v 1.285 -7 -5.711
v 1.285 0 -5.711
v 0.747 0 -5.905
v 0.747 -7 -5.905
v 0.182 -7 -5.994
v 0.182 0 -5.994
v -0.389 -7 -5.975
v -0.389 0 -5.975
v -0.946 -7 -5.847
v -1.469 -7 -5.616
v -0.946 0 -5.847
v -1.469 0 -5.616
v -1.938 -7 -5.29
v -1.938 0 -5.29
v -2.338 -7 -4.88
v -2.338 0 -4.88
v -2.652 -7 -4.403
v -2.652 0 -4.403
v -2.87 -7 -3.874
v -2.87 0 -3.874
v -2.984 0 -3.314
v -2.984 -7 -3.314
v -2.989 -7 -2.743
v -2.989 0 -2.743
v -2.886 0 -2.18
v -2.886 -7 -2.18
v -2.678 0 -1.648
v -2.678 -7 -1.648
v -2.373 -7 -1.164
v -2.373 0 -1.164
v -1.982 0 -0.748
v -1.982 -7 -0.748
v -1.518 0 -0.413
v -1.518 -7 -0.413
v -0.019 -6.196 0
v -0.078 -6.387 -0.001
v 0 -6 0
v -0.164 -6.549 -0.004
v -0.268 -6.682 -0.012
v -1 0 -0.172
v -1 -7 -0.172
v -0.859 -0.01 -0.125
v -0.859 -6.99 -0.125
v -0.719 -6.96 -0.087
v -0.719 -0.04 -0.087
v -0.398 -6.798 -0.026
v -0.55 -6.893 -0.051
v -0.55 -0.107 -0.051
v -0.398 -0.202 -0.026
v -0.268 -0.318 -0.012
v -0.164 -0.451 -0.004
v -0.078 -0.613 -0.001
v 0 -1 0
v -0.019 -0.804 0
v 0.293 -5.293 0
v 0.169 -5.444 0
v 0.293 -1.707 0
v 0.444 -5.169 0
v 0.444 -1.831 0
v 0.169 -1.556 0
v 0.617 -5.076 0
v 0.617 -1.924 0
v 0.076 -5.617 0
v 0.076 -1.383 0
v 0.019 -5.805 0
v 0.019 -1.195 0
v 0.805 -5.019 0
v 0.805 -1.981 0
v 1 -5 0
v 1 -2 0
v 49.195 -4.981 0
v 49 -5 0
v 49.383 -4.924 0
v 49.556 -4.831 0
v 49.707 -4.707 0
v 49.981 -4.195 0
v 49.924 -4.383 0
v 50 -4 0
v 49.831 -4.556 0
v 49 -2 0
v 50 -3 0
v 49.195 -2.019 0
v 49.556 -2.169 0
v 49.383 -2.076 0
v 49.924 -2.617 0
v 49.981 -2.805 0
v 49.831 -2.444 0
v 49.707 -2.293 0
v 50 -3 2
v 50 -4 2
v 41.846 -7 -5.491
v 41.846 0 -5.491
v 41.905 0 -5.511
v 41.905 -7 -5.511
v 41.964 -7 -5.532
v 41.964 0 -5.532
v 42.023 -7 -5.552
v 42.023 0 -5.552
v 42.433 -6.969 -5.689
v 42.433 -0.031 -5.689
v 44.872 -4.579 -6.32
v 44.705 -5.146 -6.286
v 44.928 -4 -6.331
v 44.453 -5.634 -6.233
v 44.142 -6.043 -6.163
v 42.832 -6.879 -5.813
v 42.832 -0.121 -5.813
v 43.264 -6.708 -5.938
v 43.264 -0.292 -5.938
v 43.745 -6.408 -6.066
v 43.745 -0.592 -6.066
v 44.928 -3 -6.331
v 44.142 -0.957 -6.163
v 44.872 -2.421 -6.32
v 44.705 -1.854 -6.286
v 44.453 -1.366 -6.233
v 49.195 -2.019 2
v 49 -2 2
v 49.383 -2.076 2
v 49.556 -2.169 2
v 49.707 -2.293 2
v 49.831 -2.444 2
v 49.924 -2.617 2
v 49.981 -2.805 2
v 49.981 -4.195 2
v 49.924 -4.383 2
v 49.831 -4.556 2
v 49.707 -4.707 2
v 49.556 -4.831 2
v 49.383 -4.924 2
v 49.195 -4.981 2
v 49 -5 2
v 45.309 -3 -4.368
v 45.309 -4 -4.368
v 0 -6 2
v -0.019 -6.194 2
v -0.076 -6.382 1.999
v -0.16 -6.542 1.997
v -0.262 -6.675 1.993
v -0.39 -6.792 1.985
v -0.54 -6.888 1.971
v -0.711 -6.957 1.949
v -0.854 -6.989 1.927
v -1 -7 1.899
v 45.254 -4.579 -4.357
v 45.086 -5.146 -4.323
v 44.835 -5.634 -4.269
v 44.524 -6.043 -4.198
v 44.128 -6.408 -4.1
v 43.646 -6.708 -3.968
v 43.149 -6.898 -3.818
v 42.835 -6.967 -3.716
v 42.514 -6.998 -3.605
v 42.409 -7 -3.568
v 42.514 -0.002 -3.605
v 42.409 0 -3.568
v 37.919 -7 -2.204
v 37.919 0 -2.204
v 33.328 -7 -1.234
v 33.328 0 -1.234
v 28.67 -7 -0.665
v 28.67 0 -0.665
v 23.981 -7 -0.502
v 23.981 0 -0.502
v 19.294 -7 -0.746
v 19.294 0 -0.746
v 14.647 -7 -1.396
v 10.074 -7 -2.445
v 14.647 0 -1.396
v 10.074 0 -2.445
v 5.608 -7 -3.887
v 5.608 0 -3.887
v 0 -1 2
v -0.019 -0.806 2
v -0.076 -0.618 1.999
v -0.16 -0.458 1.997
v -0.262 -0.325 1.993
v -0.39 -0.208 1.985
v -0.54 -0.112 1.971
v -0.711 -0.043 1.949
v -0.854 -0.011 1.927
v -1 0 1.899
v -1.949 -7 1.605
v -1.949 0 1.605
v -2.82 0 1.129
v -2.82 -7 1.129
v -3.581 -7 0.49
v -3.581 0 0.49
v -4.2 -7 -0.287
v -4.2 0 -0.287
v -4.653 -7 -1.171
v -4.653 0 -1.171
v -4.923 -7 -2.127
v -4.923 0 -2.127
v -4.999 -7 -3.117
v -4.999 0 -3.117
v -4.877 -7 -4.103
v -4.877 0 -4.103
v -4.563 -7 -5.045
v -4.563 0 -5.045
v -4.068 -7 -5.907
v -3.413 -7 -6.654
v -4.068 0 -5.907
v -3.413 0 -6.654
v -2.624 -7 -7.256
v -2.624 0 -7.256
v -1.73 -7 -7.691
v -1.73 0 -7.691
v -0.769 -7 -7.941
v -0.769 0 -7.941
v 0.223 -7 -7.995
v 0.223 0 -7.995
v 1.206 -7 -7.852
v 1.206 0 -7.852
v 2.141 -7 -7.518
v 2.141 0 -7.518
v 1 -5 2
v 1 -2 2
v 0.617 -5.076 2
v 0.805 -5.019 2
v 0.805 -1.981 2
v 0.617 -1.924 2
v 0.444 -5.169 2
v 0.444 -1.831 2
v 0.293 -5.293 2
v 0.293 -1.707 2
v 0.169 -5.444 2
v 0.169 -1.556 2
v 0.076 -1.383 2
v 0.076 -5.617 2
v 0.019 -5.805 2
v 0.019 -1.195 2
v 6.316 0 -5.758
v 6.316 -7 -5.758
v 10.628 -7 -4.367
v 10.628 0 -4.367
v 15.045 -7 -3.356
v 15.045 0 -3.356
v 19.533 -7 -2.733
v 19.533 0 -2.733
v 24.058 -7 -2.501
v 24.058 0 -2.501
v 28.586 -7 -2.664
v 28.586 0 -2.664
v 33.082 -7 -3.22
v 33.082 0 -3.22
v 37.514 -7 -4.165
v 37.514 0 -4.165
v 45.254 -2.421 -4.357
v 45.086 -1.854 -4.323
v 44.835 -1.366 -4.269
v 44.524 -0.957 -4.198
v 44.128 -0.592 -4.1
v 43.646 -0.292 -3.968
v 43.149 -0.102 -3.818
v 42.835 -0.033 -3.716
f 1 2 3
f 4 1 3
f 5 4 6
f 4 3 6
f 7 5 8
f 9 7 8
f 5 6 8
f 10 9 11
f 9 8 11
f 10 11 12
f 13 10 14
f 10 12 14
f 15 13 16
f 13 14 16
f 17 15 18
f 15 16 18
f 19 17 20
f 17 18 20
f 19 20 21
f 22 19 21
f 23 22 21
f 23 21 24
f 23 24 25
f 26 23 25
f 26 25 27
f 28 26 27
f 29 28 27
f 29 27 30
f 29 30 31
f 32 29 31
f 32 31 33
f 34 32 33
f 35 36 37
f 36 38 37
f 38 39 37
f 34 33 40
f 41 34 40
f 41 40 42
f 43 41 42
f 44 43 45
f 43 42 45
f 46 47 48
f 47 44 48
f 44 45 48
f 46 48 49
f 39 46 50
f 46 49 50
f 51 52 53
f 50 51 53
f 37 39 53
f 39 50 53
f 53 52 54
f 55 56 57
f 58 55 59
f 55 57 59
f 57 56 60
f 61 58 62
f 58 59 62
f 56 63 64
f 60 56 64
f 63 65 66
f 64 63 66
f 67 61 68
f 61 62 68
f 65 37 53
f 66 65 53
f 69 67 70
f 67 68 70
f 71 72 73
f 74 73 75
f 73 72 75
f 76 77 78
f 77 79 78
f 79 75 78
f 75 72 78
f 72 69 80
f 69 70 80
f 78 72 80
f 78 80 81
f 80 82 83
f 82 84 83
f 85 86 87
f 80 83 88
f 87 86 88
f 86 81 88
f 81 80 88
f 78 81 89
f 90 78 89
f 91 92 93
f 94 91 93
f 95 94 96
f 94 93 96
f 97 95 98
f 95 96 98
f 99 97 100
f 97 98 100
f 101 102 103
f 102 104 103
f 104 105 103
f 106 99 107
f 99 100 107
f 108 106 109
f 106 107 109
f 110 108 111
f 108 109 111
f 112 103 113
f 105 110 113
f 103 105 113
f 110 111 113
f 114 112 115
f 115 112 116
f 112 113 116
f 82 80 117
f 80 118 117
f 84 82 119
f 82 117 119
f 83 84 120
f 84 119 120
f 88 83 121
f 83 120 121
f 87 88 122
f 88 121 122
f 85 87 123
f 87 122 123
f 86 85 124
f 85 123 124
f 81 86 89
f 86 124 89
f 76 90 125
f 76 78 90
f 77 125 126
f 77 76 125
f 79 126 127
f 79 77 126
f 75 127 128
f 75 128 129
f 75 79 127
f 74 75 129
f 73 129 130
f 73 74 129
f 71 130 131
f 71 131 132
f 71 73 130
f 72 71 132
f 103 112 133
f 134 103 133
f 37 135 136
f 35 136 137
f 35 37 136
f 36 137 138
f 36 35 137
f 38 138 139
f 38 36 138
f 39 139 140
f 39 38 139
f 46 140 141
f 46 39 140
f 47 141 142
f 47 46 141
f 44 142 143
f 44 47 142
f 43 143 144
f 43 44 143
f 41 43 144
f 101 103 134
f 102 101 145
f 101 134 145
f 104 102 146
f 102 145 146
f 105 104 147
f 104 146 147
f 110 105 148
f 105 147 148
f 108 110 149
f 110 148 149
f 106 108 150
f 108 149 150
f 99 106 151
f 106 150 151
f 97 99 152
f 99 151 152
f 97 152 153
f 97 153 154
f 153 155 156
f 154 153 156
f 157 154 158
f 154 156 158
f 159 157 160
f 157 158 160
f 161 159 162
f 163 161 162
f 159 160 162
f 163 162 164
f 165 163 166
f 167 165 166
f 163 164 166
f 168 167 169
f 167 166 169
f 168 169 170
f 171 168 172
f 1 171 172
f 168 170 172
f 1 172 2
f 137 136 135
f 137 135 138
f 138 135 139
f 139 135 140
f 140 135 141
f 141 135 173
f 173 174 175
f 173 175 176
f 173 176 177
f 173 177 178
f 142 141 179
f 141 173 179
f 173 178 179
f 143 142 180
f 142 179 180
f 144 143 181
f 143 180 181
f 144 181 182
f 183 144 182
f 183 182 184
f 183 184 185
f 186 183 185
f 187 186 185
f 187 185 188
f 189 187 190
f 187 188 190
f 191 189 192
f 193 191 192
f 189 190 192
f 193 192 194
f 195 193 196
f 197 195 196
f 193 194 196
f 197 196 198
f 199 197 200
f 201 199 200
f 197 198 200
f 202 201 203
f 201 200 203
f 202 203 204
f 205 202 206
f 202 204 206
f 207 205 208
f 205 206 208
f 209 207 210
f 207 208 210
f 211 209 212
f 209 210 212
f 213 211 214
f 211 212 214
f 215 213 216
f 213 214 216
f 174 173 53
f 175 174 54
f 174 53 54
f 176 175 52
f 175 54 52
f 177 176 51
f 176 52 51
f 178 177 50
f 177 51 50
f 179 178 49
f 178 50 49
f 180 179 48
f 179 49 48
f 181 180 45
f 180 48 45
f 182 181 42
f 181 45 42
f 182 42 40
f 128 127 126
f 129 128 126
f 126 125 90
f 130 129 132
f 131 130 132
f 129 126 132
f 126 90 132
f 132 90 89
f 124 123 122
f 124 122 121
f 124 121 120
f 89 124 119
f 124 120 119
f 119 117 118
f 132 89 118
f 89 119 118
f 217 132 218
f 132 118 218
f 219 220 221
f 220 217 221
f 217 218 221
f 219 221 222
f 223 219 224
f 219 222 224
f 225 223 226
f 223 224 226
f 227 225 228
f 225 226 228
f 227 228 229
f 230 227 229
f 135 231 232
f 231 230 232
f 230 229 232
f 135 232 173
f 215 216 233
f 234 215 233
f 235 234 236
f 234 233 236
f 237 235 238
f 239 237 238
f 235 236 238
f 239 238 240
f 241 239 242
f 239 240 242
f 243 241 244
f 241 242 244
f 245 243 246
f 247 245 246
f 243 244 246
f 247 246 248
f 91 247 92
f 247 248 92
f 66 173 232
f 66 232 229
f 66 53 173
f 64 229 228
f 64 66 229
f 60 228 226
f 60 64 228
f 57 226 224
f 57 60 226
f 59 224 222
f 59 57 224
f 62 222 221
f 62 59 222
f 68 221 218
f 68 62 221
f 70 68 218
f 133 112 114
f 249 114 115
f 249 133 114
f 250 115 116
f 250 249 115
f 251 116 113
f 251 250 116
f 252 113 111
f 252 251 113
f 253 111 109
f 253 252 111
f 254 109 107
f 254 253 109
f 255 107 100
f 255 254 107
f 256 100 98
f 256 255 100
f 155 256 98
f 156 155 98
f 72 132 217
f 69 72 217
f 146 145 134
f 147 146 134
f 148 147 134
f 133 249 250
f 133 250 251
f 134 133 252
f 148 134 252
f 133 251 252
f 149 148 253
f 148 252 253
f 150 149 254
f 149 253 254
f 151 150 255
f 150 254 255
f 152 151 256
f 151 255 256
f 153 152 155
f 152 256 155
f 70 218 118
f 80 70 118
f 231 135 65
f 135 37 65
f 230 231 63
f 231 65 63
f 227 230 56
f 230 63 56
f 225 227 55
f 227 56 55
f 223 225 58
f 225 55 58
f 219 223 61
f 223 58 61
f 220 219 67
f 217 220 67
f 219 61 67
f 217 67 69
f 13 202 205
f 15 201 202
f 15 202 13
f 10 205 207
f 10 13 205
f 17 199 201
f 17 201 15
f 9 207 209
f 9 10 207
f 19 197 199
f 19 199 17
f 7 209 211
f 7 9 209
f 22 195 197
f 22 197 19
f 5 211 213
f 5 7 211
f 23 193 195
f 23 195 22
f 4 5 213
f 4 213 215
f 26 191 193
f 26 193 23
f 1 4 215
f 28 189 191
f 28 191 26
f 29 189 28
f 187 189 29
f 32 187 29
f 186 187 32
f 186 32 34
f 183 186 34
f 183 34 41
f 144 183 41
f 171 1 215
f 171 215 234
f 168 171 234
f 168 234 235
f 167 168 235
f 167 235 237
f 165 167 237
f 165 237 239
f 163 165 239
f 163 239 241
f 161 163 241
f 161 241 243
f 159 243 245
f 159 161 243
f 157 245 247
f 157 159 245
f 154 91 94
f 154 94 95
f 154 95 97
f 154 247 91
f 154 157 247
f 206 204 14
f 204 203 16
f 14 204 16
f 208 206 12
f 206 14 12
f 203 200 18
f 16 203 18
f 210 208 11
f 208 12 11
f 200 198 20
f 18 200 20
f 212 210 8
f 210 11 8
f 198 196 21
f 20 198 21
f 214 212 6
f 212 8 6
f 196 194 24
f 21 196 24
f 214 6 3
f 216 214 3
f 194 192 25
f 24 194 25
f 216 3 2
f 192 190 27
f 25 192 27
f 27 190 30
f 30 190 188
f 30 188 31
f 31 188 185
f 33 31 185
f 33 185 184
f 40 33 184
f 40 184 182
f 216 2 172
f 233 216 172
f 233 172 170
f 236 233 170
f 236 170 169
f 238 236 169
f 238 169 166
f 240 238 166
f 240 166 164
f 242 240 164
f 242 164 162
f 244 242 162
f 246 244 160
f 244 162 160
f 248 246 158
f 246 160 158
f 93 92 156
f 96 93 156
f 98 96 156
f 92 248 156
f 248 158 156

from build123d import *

# Parameters (mm, degrees)
F1_DEPTH = 7
F4_DEPTH = 2
F5_R     = 0.99999
F6_R     = 3


# Not quite as in the source:
# - a fillet or chamfer is up to 0.001 mm smaller than in the source, because OpenCascade refuses the exact size


with BuildPart() as f1:
    # F0 (on Front) → F1 (new body)
    with BuildSketch(Plane.XZ):
        with BuildLine():
            ThreePointArc((1.2846968546, -5.7110060848), (-2.9268599432, -3.6584002375), (0, 0))
            Line((0, 0), (50, 0))
            Line((50, 0), (50, 2))
            Line((50, 2), (0, 2))
            ThreePointArc((0, 2), (-4.8780999054, -4.0973337292), (2.1411614243, -7.5183434747))
            ThreePointArc((2.1411614243, -7.5183434747), (21.7926594555, -2.5678073417), (41.8462591278, -5.4905326207))
            ThreePointArc((41.8462591278, -5.4905326207), (43.3714151553, -5.9679500269), (44.9277769901, -6.3309460698))
            Line((44.9277769901, -6.3309460698), (45.3094672073, -4.3677057436))
            ThreePointArc((45.3094672073, -4.3677057436), (43.8976496677, -4.0384223028), (42.5141397524, -3.6053441762))
            ThreePointArc((42.5141397524, -3.6053441762), (21.6906488053, -0.5704105791), (1.2846968546, -5.7110060848))
        make_face()
    extrude(amount=F1_DEPTH)

    # F3 (on face) → F4 (cut)
    with BuildSketch(Plane.XY.offset(2)):
        Polygon((0, -2), (941.9215958638, -2), (50, 0), (0, 0), align=None)
        Polygon((941.9215958638, -5), (0, -5), (0, -7), (0.1395036115, -8.5481454325), (941.9215958638, -6.9726880672), align=None)
    extrude(amount=-F4_DEPTH, mode=Mode.SUBTRACT)

    # F5 (radius 1 in the source; OpenCascade refuses exactly that, so slightly less here)
    f5_edges = [f1.edges().sort_by_distance(p)[0] for p in [
        (0, 0, 1),
        (0, -5, 1),
        (50, -5, 1),
        (50, -2, 1),
        (0, -7, 1),
        (0, -2, 1),
    ]]
    fillet(f5_edges, radius=F5_R)

    # F6
    f6_edges = [f1.edges().sort_by_distance(p)[0] for p in [
        (45.118622, -7, -5.349326),
        (45.118622, 0, -5.349326),
    ]]
    fillet(f6_edges, radius=F6_R)


solid = f1.part
